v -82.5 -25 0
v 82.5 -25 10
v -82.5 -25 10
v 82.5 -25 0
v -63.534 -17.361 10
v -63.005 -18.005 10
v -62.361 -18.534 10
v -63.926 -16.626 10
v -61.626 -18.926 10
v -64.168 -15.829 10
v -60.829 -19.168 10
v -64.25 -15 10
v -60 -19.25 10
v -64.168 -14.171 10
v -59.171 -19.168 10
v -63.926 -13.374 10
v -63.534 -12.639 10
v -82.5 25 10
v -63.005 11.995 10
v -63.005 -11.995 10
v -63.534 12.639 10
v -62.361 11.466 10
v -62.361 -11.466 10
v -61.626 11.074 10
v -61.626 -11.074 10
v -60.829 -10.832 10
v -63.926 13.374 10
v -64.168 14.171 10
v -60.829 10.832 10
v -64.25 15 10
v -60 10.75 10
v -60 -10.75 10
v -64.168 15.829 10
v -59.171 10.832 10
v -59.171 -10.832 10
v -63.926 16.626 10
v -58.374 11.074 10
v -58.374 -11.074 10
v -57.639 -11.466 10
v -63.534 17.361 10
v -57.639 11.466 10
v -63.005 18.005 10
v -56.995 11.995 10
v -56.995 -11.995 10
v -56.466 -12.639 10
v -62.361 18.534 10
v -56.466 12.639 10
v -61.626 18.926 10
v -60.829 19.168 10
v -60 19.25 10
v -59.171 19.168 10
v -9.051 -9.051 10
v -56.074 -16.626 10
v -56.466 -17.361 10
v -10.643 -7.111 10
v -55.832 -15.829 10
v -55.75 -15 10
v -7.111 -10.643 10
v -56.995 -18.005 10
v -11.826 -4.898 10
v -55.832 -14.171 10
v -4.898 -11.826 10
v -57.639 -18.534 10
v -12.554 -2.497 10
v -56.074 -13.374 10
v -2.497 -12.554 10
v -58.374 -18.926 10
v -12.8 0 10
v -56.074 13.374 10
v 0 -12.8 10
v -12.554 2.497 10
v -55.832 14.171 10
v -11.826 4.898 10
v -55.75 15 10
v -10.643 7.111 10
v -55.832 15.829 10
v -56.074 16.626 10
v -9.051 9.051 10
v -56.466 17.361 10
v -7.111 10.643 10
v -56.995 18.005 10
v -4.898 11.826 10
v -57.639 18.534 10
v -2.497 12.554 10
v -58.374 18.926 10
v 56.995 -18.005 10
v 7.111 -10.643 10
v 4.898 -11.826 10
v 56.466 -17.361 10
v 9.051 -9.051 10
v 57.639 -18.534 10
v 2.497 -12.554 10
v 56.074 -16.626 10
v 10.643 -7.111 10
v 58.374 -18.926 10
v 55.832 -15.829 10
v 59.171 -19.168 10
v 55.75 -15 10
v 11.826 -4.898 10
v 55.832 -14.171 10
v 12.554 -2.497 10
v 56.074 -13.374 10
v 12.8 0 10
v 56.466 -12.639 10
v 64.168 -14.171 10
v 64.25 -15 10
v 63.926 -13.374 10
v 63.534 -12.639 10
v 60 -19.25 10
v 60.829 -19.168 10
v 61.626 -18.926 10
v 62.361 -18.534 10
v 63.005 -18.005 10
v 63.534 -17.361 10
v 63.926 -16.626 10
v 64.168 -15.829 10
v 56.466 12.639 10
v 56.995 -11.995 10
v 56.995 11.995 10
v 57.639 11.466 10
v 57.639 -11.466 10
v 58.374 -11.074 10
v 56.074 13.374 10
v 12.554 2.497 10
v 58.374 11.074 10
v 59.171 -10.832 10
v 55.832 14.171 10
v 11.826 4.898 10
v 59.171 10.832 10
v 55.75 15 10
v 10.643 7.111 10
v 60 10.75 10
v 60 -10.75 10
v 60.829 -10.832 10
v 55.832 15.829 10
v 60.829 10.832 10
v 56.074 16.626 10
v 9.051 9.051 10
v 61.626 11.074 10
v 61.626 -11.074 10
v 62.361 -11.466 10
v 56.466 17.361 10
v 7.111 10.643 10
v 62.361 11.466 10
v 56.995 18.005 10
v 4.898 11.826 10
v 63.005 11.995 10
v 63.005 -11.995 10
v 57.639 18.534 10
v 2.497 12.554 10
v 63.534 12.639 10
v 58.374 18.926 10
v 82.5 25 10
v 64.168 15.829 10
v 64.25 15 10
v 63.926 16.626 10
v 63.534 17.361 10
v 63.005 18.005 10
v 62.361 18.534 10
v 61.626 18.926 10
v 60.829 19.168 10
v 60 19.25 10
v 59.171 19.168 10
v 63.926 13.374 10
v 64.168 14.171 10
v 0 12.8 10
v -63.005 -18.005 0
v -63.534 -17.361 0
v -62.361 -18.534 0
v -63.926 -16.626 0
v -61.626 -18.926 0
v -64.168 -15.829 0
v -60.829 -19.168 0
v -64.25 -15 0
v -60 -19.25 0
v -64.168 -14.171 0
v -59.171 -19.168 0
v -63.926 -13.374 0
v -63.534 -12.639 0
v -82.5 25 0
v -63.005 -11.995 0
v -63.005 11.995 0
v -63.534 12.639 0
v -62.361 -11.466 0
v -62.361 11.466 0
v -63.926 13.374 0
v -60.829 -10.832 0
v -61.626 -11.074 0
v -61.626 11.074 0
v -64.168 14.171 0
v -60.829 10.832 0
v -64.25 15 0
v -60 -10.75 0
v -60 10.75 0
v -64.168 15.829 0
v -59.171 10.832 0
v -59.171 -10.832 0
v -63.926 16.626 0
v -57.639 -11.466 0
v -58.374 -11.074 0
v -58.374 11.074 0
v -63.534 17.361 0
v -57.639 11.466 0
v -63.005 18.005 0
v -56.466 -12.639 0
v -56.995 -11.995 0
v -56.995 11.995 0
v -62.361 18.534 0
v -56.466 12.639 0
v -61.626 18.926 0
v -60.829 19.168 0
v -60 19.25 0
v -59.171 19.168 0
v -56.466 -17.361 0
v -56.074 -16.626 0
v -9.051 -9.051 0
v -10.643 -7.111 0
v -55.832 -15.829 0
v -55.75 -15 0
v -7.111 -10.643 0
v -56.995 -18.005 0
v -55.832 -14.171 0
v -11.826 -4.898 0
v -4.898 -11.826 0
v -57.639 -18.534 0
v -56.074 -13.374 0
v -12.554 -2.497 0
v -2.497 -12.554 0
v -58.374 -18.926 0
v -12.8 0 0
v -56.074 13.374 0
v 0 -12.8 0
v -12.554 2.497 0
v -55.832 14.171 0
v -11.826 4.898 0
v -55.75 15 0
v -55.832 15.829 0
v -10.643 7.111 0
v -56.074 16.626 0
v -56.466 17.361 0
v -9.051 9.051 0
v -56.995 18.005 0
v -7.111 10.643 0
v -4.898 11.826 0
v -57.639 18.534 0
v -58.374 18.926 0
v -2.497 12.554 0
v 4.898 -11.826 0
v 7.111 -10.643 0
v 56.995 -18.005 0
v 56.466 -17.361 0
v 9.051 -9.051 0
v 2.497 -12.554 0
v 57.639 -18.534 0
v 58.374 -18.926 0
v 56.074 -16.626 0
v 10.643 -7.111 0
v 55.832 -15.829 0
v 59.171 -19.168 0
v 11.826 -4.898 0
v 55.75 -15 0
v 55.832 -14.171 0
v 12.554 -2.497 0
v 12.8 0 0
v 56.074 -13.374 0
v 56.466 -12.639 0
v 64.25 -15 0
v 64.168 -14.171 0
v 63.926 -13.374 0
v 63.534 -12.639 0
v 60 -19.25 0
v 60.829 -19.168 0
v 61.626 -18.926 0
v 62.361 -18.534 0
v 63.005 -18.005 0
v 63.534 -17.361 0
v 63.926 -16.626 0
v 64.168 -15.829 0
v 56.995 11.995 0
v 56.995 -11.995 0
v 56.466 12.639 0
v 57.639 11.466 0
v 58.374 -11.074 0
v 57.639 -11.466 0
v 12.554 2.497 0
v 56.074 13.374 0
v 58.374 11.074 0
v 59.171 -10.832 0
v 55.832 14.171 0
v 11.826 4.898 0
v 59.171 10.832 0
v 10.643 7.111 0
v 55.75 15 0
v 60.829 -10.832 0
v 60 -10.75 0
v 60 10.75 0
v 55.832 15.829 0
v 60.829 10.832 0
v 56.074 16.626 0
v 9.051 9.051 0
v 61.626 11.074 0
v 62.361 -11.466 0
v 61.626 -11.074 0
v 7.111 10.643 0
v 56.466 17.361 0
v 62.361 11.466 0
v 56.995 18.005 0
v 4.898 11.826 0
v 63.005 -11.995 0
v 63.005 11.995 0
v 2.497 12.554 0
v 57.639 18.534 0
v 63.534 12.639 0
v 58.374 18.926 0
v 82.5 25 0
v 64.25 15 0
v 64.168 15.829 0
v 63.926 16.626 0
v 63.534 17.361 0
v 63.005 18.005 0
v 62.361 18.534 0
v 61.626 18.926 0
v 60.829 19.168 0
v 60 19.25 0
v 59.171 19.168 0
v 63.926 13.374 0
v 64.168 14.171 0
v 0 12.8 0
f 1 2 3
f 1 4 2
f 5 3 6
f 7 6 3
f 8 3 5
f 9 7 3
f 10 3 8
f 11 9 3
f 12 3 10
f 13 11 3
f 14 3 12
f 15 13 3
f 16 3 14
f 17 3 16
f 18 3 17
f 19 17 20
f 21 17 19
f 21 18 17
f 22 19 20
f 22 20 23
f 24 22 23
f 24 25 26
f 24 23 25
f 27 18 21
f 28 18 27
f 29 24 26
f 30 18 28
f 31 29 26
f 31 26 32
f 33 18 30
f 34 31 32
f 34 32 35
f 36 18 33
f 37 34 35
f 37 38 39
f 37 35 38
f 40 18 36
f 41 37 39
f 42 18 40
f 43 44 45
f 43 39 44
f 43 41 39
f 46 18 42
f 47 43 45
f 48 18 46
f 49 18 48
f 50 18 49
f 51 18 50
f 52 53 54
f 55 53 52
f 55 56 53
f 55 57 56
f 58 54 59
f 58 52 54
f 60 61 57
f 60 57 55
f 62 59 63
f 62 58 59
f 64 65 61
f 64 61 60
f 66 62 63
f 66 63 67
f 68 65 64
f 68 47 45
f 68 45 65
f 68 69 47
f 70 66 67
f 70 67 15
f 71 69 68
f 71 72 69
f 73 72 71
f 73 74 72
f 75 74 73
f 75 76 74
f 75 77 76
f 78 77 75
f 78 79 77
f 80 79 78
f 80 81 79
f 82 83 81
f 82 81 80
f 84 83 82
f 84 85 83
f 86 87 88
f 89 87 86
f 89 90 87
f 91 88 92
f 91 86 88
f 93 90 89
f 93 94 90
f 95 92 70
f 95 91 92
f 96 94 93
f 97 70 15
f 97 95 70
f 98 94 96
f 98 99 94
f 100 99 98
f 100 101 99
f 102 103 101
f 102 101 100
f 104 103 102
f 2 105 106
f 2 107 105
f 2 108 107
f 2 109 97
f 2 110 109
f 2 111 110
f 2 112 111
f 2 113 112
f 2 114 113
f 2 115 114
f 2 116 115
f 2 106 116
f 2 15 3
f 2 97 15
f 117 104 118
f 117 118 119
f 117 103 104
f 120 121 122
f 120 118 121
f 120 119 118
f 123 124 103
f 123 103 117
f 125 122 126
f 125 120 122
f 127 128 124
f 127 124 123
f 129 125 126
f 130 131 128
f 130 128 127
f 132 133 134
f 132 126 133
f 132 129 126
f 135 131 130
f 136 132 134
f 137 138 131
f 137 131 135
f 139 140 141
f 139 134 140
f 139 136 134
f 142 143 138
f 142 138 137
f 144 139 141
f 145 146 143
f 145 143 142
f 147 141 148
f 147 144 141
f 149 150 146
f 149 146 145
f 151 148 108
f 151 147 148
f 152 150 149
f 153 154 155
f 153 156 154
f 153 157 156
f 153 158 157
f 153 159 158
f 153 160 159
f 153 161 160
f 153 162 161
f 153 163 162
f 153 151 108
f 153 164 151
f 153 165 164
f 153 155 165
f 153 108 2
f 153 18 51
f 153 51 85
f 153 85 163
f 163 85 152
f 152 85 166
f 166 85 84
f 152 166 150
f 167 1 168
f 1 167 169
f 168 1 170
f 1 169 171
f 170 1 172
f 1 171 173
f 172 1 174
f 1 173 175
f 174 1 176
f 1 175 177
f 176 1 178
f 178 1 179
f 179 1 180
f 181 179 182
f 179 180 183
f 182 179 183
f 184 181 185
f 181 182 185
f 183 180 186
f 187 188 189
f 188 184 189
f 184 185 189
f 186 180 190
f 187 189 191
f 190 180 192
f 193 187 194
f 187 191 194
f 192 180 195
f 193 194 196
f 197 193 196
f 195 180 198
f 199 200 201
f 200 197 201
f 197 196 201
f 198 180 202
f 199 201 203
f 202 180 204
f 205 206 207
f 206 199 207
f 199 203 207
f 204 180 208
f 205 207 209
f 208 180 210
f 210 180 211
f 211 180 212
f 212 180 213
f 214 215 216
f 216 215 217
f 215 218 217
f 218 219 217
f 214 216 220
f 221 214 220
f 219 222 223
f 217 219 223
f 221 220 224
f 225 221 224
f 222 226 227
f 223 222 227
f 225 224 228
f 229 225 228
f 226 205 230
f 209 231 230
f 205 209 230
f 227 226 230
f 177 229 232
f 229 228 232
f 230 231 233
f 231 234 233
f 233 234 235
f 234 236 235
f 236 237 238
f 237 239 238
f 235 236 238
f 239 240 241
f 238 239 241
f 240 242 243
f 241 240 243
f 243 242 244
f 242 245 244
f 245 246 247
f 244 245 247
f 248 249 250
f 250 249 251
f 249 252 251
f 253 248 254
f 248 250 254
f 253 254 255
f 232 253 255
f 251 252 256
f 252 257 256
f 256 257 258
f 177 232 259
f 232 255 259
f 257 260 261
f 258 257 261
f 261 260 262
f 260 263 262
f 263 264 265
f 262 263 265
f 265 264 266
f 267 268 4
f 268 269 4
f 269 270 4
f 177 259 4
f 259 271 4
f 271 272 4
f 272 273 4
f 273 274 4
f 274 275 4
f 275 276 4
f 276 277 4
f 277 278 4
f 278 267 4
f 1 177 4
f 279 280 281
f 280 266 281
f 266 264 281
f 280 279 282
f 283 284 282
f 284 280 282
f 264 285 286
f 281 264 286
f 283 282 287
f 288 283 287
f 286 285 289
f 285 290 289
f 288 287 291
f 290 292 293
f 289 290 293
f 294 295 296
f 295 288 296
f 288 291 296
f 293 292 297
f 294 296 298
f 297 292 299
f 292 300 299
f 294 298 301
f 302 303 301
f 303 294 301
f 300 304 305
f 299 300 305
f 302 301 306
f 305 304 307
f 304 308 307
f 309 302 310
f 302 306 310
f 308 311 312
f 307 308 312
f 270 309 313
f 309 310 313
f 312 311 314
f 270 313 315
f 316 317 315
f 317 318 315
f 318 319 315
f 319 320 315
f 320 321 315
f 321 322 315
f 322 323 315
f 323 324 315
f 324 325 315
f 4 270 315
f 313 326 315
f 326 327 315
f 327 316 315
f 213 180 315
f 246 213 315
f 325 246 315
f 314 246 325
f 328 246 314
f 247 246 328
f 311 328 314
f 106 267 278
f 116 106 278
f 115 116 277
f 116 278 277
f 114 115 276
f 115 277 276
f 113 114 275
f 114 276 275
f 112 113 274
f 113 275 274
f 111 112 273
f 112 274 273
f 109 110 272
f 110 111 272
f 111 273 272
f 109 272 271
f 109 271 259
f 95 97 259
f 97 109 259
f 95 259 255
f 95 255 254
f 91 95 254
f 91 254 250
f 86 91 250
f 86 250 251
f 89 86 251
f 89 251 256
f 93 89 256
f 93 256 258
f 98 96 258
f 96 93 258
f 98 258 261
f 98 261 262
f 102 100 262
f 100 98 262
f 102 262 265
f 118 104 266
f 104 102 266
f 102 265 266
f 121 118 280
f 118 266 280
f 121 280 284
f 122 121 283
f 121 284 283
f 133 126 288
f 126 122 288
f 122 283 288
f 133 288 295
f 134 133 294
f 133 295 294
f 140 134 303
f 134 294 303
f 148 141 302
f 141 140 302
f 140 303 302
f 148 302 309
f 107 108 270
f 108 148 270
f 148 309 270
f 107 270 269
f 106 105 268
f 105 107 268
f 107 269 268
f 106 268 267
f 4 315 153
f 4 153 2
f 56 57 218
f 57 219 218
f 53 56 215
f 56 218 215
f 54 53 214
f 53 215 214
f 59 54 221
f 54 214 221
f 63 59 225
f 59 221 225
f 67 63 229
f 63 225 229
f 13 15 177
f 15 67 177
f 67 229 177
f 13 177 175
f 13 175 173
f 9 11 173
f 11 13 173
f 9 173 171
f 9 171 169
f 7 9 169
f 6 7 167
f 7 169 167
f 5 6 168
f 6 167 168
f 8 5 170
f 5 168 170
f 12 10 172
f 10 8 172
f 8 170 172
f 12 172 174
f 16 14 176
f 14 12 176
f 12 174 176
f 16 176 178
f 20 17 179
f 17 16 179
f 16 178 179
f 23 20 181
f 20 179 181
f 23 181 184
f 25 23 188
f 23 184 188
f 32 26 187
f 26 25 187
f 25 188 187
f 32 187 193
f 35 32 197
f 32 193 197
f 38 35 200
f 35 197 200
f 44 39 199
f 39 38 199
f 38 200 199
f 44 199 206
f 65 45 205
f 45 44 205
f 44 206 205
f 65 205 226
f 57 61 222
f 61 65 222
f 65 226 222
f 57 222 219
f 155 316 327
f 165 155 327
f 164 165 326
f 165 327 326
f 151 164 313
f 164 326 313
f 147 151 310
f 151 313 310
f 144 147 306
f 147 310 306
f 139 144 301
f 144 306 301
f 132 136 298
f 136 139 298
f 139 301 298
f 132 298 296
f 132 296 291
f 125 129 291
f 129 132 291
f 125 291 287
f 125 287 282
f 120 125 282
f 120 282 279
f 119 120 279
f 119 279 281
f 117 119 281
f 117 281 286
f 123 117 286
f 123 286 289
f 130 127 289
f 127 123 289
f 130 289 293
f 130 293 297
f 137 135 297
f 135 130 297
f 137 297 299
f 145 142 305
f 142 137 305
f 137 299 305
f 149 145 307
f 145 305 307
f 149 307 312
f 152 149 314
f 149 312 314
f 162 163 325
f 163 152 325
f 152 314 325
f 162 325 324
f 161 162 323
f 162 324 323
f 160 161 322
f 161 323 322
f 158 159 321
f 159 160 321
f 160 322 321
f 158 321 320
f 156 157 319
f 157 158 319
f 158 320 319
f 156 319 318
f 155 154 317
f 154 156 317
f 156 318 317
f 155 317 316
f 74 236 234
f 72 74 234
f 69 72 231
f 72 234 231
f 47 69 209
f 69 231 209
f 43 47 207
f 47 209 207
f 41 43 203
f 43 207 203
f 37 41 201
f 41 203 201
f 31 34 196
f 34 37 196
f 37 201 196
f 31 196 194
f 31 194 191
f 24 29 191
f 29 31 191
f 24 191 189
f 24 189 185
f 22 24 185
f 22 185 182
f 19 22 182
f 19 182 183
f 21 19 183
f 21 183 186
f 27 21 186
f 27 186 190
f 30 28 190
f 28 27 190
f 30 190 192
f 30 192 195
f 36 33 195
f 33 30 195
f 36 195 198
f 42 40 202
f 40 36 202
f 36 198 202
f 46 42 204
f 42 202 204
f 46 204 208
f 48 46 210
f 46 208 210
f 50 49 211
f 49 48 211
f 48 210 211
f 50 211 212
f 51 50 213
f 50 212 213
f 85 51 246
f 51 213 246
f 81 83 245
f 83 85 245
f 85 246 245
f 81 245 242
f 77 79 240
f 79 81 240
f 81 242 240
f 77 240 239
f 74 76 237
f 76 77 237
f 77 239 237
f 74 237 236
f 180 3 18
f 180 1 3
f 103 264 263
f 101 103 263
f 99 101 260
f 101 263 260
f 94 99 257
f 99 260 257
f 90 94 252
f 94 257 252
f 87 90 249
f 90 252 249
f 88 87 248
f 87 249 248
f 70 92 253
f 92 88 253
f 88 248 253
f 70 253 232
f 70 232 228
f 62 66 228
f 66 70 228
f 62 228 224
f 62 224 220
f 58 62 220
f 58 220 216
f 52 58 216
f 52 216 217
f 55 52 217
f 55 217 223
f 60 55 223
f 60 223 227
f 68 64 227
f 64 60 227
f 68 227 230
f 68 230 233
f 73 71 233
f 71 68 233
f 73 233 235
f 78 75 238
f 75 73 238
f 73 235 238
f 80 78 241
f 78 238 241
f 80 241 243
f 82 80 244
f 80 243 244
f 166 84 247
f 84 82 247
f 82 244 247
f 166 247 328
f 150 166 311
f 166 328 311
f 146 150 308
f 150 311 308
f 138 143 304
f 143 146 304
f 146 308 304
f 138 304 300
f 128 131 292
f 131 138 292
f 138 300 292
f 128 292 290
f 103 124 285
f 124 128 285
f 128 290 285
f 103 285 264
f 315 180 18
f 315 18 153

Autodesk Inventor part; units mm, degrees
ref_plane "YZ Plane" through (0, 0, 0) normal (1, 0, 0) x (0, 1, 0)
ref_plane "XZ Plane" through (0, 0, 0) normal (0, 1, 0) x (-1, 0, 0)
ref_plane "XY Plane" through (0, 0, 0) normal (0, 0, 1) x (1, 0, 0)
sketch "Sketch1" plane through (0, 0, 0) normal (0, 0, 1) x (1, 0, 0)
  line L0 (-82.5, 25) -> (82.5, 25)
  line L1 (82.5, 25) -> (82.5, -25)
  line L2 (82.5, -25) -> (-82.5, -25)
  line L3 (-82.5, -25) -> (-82.5, 25)
  circle A0 centre (0, 0) radius 12.8
  circle A1 centre (-60, 15) radius 4.25
  circle A2 centre (-60, -15) radius 4.25
  circle A3 centre (60, 15) radius 4.25
  circle A4 centre (60, -15) radius 4.25
  dimension "d0" = 165
  dimension "d1" = 82.5
  dimension "d2" = 25.6
  dimension "d3" = 50
  dimension "d4" = 25
  dimension "d5" = 8.5
  dimension "d6" = 22.5
  dimension "d7" = 22.5
  dimension "d8" = 22.5
  dimension "d9" = 22.5
  dimension "d10" = 10
  dimension "d11" = 10
  dimension "d12" = 10
  dimension "d13" = 10
extrude "Extrusion1" add sketch "Sketch1" along normal blind 10
properties part number "1222_Former Shaft Plate_V1" material "Aluminum 6061"
